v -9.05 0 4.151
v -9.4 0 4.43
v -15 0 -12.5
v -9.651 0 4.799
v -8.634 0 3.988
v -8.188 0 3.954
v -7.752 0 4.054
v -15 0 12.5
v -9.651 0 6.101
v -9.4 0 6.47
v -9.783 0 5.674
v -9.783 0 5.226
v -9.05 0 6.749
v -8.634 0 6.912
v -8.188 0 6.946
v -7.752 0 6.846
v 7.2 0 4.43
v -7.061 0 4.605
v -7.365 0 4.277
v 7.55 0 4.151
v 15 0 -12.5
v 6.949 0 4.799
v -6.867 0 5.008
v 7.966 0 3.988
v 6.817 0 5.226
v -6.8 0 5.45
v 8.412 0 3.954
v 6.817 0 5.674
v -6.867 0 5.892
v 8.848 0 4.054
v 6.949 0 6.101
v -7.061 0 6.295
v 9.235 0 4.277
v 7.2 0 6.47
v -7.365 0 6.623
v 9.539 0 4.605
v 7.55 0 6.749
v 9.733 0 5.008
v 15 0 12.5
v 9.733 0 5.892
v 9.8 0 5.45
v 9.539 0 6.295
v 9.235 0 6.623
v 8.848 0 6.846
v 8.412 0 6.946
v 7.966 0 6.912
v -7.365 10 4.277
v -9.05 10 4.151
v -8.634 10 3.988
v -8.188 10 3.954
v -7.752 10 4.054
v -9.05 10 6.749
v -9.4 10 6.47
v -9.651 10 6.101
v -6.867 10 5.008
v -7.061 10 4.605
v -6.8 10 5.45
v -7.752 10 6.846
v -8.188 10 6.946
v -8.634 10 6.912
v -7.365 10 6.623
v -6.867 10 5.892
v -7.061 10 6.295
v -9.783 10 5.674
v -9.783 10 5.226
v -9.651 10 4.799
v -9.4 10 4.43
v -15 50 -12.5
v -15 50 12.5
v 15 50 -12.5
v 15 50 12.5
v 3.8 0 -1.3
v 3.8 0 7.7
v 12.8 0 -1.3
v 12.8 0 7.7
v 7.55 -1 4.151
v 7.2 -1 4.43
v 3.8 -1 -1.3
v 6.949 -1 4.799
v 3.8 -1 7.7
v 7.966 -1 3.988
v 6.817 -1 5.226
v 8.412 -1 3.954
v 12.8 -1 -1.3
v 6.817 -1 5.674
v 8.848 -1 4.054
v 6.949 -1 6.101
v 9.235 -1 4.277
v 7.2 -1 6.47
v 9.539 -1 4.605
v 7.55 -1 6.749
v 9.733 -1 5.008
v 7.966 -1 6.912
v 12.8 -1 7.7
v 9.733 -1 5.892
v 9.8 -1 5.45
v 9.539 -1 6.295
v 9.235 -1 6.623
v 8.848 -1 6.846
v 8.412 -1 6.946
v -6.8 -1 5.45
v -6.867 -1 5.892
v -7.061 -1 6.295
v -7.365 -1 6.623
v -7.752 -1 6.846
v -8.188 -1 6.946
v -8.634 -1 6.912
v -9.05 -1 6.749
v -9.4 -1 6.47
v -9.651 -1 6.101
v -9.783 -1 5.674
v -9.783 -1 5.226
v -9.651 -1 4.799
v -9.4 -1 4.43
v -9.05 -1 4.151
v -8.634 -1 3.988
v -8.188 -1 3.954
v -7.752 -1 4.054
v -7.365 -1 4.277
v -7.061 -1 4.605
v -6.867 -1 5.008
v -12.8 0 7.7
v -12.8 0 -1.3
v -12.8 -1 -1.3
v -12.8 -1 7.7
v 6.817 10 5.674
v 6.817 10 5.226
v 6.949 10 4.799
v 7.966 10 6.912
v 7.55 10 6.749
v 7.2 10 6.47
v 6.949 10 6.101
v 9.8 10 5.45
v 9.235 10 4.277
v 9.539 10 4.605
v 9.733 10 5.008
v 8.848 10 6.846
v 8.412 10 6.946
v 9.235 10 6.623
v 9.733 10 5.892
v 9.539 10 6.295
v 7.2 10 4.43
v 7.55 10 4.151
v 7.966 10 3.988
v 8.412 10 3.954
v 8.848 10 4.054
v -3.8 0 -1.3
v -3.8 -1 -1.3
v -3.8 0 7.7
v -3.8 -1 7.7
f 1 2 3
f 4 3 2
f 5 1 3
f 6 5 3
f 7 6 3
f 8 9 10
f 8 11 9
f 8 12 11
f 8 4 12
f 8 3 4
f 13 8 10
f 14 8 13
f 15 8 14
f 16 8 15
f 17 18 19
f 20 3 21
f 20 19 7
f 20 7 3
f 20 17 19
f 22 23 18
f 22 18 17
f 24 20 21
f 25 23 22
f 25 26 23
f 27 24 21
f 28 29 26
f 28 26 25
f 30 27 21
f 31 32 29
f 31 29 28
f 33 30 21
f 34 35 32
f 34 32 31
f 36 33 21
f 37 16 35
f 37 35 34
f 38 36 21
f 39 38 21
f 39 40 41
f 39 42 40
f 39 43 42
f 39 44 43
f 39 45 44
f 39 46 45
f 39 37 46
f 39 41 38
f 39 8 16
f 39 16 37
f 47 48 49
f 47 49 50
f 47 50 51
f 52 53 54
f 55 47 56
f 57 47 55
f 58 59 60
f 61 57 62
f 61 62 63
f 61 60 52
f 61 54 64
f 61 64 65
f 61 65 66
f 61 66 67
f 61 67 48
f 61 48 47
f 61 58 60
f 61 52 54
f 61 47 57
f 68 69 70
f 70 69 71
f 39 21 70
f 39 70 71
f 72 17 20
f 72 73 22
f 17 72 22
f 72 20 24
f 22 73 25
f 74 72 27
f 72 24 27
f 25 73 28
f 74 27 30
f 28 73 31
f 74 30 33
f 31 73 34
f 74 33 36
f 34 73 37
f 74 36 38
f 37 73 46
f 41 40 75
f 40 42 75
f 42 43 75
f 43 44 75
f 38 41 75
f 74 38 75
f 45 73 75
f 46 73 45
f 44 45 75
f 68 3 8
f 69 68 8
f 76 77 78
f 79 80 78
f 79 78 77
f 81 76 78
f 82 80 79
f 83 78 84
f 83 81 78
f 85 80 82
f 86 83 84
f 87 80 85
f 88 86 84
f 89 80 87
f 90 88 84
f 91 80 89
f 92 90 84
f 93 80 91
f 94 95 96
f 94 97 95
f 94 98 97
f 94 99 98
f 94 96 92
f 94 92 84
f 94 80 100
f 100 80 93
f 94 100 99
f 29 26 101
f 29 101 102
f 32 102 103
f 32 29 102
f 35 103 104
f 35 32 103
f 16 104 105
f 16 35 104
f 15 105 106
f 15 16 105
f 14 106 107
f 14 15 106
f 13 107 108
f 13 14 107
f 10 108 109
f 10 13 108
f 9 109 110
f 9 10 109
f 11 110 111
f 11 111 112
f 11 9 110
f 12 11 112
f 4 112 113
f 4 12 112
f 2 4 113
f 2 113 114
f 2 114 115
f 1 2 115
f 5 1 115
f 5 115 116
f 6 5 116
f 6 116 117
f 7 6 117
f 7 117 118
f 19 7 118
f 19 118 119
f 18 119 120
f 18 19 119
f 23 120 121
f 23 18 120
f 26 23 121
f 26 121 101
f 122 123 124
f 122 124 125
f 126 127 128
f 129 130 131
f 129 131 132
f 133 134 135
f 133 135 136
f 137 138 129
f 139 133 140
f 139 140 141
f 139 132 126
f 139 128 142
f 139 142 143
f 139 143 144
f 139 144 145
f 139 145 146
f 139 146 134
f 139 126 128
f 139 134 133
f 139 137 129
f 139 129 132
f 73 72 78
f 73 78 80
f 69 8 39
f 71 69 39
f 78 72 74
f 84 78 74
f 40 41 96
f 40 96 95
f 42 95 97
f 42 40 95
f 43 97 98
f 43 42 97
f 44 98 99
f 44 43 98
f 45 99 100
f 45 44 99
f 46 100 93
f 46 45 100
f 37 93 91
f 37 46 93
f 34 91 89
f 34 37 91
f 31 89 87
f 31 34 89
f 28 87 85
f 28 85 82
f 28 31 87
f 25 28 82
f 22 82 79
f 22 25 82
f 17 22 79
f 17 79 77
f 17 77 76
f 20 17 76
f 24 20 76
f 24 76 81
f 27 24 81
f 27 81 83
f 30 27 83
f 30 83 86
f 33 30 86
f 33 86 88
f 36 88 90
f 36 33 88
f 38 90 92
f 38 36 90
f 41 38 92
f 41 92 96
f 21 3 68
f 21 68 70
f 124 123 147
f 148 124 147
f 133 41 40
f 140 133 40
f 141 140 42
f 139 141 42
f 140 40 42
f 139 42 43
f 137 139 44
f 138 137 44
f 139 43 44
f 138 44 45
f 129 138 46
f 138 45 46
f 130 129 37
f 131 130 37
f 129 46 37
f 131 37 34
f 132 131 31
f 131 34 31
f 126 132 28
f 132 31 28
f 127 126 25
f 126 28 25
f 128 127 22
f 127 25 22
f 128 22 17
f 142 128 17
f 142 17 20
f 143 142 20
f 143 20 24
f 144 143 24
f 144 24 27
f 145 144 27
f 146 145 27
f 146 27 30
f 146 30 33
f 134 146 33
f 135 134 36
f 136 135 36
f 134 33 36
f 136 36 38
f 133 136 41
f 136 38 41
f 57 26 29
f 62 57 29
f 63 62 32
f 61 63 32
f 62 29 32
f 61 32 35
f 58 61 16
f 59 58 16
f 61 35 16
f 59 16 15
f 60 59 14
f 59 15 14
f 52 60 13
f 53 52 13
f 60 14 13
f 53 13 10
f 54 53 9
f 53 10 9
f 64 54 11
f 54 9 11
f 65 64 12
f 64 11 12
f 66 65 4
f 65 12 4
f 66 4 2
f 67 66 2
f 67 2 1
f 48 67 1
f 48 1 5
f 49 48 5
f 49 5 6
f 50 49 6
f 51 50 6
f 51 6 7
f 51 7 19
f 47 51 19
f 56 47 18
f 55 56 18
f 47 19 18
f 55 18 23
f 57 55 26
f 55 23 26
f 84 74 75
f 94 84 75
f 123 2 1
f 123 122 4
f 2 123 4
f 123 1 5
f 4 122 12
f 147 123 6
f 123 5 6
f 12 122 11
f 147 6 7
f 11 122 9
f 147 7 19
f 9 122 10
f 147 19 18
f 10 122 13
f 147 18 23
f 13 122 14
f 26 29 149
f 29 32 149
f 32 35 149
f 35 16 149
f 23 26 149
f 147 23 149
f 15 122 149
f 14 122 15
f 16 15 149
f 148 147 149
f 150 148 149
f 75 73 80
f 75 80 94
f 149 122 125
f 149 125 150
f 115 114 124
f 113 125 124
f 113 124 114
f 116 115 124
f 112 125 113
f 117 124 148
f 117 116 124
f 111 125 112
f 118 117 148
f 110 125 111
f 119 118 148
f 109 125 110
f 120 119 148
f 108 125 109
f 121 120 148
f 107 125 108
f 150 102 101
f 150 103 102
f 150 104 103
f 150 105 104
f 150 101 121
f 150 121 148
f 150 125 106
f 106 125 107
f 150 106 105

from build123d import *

# Parameters (mm, degrees)
F0_W     = 30
F0_H     = 25
F1_DEPTH = 50
F2_R     = 1.5
F3_DEPTH = 10
F2_W     = 9
F2_H     = 9
F4_DEPTH = 1


with BuildPart() as f1:
    # F0 (on Front) → F1 (new body)
    with BuildSketch(Plane.XZ):
        Rectangle(F0_W, F0_H)
    extrude(amount=-F1_DEPTH)

    # F2 (on face) → F3 (cut)
    with BuildSketch(Plane.XZ):
        with Locations((-8.3, 5.45)):
            Circle(F2_R)
        with Locations((8.3, 5.45)):
            Circle(F2_R)
    extrude(amount=-F3_DEPTH, mode=Mode.SUBTRACT)


with BuildPart() as f4:
    # F2 (on face) → F4 (new body)
    with BuildSketch(Plane.XZ):
        with Locations((-8.3, 3.2)):
            Rectangle(F2_W, F2_H)
        with Locations((-8.3, 5.45)):
            Circle(F2_R, mode=Mode.SUBTRACT)
        with Locations((8.3, 3.2)):
            Rectangle(F2_W, F2_H)
        with Locations((8.3, 5.45)):
            Circle(F2_R, mode=Mode.SUBTRACT)
    extrude(amount=F4_DEPTH)


solid = Compound([f1.part, f4.part])
